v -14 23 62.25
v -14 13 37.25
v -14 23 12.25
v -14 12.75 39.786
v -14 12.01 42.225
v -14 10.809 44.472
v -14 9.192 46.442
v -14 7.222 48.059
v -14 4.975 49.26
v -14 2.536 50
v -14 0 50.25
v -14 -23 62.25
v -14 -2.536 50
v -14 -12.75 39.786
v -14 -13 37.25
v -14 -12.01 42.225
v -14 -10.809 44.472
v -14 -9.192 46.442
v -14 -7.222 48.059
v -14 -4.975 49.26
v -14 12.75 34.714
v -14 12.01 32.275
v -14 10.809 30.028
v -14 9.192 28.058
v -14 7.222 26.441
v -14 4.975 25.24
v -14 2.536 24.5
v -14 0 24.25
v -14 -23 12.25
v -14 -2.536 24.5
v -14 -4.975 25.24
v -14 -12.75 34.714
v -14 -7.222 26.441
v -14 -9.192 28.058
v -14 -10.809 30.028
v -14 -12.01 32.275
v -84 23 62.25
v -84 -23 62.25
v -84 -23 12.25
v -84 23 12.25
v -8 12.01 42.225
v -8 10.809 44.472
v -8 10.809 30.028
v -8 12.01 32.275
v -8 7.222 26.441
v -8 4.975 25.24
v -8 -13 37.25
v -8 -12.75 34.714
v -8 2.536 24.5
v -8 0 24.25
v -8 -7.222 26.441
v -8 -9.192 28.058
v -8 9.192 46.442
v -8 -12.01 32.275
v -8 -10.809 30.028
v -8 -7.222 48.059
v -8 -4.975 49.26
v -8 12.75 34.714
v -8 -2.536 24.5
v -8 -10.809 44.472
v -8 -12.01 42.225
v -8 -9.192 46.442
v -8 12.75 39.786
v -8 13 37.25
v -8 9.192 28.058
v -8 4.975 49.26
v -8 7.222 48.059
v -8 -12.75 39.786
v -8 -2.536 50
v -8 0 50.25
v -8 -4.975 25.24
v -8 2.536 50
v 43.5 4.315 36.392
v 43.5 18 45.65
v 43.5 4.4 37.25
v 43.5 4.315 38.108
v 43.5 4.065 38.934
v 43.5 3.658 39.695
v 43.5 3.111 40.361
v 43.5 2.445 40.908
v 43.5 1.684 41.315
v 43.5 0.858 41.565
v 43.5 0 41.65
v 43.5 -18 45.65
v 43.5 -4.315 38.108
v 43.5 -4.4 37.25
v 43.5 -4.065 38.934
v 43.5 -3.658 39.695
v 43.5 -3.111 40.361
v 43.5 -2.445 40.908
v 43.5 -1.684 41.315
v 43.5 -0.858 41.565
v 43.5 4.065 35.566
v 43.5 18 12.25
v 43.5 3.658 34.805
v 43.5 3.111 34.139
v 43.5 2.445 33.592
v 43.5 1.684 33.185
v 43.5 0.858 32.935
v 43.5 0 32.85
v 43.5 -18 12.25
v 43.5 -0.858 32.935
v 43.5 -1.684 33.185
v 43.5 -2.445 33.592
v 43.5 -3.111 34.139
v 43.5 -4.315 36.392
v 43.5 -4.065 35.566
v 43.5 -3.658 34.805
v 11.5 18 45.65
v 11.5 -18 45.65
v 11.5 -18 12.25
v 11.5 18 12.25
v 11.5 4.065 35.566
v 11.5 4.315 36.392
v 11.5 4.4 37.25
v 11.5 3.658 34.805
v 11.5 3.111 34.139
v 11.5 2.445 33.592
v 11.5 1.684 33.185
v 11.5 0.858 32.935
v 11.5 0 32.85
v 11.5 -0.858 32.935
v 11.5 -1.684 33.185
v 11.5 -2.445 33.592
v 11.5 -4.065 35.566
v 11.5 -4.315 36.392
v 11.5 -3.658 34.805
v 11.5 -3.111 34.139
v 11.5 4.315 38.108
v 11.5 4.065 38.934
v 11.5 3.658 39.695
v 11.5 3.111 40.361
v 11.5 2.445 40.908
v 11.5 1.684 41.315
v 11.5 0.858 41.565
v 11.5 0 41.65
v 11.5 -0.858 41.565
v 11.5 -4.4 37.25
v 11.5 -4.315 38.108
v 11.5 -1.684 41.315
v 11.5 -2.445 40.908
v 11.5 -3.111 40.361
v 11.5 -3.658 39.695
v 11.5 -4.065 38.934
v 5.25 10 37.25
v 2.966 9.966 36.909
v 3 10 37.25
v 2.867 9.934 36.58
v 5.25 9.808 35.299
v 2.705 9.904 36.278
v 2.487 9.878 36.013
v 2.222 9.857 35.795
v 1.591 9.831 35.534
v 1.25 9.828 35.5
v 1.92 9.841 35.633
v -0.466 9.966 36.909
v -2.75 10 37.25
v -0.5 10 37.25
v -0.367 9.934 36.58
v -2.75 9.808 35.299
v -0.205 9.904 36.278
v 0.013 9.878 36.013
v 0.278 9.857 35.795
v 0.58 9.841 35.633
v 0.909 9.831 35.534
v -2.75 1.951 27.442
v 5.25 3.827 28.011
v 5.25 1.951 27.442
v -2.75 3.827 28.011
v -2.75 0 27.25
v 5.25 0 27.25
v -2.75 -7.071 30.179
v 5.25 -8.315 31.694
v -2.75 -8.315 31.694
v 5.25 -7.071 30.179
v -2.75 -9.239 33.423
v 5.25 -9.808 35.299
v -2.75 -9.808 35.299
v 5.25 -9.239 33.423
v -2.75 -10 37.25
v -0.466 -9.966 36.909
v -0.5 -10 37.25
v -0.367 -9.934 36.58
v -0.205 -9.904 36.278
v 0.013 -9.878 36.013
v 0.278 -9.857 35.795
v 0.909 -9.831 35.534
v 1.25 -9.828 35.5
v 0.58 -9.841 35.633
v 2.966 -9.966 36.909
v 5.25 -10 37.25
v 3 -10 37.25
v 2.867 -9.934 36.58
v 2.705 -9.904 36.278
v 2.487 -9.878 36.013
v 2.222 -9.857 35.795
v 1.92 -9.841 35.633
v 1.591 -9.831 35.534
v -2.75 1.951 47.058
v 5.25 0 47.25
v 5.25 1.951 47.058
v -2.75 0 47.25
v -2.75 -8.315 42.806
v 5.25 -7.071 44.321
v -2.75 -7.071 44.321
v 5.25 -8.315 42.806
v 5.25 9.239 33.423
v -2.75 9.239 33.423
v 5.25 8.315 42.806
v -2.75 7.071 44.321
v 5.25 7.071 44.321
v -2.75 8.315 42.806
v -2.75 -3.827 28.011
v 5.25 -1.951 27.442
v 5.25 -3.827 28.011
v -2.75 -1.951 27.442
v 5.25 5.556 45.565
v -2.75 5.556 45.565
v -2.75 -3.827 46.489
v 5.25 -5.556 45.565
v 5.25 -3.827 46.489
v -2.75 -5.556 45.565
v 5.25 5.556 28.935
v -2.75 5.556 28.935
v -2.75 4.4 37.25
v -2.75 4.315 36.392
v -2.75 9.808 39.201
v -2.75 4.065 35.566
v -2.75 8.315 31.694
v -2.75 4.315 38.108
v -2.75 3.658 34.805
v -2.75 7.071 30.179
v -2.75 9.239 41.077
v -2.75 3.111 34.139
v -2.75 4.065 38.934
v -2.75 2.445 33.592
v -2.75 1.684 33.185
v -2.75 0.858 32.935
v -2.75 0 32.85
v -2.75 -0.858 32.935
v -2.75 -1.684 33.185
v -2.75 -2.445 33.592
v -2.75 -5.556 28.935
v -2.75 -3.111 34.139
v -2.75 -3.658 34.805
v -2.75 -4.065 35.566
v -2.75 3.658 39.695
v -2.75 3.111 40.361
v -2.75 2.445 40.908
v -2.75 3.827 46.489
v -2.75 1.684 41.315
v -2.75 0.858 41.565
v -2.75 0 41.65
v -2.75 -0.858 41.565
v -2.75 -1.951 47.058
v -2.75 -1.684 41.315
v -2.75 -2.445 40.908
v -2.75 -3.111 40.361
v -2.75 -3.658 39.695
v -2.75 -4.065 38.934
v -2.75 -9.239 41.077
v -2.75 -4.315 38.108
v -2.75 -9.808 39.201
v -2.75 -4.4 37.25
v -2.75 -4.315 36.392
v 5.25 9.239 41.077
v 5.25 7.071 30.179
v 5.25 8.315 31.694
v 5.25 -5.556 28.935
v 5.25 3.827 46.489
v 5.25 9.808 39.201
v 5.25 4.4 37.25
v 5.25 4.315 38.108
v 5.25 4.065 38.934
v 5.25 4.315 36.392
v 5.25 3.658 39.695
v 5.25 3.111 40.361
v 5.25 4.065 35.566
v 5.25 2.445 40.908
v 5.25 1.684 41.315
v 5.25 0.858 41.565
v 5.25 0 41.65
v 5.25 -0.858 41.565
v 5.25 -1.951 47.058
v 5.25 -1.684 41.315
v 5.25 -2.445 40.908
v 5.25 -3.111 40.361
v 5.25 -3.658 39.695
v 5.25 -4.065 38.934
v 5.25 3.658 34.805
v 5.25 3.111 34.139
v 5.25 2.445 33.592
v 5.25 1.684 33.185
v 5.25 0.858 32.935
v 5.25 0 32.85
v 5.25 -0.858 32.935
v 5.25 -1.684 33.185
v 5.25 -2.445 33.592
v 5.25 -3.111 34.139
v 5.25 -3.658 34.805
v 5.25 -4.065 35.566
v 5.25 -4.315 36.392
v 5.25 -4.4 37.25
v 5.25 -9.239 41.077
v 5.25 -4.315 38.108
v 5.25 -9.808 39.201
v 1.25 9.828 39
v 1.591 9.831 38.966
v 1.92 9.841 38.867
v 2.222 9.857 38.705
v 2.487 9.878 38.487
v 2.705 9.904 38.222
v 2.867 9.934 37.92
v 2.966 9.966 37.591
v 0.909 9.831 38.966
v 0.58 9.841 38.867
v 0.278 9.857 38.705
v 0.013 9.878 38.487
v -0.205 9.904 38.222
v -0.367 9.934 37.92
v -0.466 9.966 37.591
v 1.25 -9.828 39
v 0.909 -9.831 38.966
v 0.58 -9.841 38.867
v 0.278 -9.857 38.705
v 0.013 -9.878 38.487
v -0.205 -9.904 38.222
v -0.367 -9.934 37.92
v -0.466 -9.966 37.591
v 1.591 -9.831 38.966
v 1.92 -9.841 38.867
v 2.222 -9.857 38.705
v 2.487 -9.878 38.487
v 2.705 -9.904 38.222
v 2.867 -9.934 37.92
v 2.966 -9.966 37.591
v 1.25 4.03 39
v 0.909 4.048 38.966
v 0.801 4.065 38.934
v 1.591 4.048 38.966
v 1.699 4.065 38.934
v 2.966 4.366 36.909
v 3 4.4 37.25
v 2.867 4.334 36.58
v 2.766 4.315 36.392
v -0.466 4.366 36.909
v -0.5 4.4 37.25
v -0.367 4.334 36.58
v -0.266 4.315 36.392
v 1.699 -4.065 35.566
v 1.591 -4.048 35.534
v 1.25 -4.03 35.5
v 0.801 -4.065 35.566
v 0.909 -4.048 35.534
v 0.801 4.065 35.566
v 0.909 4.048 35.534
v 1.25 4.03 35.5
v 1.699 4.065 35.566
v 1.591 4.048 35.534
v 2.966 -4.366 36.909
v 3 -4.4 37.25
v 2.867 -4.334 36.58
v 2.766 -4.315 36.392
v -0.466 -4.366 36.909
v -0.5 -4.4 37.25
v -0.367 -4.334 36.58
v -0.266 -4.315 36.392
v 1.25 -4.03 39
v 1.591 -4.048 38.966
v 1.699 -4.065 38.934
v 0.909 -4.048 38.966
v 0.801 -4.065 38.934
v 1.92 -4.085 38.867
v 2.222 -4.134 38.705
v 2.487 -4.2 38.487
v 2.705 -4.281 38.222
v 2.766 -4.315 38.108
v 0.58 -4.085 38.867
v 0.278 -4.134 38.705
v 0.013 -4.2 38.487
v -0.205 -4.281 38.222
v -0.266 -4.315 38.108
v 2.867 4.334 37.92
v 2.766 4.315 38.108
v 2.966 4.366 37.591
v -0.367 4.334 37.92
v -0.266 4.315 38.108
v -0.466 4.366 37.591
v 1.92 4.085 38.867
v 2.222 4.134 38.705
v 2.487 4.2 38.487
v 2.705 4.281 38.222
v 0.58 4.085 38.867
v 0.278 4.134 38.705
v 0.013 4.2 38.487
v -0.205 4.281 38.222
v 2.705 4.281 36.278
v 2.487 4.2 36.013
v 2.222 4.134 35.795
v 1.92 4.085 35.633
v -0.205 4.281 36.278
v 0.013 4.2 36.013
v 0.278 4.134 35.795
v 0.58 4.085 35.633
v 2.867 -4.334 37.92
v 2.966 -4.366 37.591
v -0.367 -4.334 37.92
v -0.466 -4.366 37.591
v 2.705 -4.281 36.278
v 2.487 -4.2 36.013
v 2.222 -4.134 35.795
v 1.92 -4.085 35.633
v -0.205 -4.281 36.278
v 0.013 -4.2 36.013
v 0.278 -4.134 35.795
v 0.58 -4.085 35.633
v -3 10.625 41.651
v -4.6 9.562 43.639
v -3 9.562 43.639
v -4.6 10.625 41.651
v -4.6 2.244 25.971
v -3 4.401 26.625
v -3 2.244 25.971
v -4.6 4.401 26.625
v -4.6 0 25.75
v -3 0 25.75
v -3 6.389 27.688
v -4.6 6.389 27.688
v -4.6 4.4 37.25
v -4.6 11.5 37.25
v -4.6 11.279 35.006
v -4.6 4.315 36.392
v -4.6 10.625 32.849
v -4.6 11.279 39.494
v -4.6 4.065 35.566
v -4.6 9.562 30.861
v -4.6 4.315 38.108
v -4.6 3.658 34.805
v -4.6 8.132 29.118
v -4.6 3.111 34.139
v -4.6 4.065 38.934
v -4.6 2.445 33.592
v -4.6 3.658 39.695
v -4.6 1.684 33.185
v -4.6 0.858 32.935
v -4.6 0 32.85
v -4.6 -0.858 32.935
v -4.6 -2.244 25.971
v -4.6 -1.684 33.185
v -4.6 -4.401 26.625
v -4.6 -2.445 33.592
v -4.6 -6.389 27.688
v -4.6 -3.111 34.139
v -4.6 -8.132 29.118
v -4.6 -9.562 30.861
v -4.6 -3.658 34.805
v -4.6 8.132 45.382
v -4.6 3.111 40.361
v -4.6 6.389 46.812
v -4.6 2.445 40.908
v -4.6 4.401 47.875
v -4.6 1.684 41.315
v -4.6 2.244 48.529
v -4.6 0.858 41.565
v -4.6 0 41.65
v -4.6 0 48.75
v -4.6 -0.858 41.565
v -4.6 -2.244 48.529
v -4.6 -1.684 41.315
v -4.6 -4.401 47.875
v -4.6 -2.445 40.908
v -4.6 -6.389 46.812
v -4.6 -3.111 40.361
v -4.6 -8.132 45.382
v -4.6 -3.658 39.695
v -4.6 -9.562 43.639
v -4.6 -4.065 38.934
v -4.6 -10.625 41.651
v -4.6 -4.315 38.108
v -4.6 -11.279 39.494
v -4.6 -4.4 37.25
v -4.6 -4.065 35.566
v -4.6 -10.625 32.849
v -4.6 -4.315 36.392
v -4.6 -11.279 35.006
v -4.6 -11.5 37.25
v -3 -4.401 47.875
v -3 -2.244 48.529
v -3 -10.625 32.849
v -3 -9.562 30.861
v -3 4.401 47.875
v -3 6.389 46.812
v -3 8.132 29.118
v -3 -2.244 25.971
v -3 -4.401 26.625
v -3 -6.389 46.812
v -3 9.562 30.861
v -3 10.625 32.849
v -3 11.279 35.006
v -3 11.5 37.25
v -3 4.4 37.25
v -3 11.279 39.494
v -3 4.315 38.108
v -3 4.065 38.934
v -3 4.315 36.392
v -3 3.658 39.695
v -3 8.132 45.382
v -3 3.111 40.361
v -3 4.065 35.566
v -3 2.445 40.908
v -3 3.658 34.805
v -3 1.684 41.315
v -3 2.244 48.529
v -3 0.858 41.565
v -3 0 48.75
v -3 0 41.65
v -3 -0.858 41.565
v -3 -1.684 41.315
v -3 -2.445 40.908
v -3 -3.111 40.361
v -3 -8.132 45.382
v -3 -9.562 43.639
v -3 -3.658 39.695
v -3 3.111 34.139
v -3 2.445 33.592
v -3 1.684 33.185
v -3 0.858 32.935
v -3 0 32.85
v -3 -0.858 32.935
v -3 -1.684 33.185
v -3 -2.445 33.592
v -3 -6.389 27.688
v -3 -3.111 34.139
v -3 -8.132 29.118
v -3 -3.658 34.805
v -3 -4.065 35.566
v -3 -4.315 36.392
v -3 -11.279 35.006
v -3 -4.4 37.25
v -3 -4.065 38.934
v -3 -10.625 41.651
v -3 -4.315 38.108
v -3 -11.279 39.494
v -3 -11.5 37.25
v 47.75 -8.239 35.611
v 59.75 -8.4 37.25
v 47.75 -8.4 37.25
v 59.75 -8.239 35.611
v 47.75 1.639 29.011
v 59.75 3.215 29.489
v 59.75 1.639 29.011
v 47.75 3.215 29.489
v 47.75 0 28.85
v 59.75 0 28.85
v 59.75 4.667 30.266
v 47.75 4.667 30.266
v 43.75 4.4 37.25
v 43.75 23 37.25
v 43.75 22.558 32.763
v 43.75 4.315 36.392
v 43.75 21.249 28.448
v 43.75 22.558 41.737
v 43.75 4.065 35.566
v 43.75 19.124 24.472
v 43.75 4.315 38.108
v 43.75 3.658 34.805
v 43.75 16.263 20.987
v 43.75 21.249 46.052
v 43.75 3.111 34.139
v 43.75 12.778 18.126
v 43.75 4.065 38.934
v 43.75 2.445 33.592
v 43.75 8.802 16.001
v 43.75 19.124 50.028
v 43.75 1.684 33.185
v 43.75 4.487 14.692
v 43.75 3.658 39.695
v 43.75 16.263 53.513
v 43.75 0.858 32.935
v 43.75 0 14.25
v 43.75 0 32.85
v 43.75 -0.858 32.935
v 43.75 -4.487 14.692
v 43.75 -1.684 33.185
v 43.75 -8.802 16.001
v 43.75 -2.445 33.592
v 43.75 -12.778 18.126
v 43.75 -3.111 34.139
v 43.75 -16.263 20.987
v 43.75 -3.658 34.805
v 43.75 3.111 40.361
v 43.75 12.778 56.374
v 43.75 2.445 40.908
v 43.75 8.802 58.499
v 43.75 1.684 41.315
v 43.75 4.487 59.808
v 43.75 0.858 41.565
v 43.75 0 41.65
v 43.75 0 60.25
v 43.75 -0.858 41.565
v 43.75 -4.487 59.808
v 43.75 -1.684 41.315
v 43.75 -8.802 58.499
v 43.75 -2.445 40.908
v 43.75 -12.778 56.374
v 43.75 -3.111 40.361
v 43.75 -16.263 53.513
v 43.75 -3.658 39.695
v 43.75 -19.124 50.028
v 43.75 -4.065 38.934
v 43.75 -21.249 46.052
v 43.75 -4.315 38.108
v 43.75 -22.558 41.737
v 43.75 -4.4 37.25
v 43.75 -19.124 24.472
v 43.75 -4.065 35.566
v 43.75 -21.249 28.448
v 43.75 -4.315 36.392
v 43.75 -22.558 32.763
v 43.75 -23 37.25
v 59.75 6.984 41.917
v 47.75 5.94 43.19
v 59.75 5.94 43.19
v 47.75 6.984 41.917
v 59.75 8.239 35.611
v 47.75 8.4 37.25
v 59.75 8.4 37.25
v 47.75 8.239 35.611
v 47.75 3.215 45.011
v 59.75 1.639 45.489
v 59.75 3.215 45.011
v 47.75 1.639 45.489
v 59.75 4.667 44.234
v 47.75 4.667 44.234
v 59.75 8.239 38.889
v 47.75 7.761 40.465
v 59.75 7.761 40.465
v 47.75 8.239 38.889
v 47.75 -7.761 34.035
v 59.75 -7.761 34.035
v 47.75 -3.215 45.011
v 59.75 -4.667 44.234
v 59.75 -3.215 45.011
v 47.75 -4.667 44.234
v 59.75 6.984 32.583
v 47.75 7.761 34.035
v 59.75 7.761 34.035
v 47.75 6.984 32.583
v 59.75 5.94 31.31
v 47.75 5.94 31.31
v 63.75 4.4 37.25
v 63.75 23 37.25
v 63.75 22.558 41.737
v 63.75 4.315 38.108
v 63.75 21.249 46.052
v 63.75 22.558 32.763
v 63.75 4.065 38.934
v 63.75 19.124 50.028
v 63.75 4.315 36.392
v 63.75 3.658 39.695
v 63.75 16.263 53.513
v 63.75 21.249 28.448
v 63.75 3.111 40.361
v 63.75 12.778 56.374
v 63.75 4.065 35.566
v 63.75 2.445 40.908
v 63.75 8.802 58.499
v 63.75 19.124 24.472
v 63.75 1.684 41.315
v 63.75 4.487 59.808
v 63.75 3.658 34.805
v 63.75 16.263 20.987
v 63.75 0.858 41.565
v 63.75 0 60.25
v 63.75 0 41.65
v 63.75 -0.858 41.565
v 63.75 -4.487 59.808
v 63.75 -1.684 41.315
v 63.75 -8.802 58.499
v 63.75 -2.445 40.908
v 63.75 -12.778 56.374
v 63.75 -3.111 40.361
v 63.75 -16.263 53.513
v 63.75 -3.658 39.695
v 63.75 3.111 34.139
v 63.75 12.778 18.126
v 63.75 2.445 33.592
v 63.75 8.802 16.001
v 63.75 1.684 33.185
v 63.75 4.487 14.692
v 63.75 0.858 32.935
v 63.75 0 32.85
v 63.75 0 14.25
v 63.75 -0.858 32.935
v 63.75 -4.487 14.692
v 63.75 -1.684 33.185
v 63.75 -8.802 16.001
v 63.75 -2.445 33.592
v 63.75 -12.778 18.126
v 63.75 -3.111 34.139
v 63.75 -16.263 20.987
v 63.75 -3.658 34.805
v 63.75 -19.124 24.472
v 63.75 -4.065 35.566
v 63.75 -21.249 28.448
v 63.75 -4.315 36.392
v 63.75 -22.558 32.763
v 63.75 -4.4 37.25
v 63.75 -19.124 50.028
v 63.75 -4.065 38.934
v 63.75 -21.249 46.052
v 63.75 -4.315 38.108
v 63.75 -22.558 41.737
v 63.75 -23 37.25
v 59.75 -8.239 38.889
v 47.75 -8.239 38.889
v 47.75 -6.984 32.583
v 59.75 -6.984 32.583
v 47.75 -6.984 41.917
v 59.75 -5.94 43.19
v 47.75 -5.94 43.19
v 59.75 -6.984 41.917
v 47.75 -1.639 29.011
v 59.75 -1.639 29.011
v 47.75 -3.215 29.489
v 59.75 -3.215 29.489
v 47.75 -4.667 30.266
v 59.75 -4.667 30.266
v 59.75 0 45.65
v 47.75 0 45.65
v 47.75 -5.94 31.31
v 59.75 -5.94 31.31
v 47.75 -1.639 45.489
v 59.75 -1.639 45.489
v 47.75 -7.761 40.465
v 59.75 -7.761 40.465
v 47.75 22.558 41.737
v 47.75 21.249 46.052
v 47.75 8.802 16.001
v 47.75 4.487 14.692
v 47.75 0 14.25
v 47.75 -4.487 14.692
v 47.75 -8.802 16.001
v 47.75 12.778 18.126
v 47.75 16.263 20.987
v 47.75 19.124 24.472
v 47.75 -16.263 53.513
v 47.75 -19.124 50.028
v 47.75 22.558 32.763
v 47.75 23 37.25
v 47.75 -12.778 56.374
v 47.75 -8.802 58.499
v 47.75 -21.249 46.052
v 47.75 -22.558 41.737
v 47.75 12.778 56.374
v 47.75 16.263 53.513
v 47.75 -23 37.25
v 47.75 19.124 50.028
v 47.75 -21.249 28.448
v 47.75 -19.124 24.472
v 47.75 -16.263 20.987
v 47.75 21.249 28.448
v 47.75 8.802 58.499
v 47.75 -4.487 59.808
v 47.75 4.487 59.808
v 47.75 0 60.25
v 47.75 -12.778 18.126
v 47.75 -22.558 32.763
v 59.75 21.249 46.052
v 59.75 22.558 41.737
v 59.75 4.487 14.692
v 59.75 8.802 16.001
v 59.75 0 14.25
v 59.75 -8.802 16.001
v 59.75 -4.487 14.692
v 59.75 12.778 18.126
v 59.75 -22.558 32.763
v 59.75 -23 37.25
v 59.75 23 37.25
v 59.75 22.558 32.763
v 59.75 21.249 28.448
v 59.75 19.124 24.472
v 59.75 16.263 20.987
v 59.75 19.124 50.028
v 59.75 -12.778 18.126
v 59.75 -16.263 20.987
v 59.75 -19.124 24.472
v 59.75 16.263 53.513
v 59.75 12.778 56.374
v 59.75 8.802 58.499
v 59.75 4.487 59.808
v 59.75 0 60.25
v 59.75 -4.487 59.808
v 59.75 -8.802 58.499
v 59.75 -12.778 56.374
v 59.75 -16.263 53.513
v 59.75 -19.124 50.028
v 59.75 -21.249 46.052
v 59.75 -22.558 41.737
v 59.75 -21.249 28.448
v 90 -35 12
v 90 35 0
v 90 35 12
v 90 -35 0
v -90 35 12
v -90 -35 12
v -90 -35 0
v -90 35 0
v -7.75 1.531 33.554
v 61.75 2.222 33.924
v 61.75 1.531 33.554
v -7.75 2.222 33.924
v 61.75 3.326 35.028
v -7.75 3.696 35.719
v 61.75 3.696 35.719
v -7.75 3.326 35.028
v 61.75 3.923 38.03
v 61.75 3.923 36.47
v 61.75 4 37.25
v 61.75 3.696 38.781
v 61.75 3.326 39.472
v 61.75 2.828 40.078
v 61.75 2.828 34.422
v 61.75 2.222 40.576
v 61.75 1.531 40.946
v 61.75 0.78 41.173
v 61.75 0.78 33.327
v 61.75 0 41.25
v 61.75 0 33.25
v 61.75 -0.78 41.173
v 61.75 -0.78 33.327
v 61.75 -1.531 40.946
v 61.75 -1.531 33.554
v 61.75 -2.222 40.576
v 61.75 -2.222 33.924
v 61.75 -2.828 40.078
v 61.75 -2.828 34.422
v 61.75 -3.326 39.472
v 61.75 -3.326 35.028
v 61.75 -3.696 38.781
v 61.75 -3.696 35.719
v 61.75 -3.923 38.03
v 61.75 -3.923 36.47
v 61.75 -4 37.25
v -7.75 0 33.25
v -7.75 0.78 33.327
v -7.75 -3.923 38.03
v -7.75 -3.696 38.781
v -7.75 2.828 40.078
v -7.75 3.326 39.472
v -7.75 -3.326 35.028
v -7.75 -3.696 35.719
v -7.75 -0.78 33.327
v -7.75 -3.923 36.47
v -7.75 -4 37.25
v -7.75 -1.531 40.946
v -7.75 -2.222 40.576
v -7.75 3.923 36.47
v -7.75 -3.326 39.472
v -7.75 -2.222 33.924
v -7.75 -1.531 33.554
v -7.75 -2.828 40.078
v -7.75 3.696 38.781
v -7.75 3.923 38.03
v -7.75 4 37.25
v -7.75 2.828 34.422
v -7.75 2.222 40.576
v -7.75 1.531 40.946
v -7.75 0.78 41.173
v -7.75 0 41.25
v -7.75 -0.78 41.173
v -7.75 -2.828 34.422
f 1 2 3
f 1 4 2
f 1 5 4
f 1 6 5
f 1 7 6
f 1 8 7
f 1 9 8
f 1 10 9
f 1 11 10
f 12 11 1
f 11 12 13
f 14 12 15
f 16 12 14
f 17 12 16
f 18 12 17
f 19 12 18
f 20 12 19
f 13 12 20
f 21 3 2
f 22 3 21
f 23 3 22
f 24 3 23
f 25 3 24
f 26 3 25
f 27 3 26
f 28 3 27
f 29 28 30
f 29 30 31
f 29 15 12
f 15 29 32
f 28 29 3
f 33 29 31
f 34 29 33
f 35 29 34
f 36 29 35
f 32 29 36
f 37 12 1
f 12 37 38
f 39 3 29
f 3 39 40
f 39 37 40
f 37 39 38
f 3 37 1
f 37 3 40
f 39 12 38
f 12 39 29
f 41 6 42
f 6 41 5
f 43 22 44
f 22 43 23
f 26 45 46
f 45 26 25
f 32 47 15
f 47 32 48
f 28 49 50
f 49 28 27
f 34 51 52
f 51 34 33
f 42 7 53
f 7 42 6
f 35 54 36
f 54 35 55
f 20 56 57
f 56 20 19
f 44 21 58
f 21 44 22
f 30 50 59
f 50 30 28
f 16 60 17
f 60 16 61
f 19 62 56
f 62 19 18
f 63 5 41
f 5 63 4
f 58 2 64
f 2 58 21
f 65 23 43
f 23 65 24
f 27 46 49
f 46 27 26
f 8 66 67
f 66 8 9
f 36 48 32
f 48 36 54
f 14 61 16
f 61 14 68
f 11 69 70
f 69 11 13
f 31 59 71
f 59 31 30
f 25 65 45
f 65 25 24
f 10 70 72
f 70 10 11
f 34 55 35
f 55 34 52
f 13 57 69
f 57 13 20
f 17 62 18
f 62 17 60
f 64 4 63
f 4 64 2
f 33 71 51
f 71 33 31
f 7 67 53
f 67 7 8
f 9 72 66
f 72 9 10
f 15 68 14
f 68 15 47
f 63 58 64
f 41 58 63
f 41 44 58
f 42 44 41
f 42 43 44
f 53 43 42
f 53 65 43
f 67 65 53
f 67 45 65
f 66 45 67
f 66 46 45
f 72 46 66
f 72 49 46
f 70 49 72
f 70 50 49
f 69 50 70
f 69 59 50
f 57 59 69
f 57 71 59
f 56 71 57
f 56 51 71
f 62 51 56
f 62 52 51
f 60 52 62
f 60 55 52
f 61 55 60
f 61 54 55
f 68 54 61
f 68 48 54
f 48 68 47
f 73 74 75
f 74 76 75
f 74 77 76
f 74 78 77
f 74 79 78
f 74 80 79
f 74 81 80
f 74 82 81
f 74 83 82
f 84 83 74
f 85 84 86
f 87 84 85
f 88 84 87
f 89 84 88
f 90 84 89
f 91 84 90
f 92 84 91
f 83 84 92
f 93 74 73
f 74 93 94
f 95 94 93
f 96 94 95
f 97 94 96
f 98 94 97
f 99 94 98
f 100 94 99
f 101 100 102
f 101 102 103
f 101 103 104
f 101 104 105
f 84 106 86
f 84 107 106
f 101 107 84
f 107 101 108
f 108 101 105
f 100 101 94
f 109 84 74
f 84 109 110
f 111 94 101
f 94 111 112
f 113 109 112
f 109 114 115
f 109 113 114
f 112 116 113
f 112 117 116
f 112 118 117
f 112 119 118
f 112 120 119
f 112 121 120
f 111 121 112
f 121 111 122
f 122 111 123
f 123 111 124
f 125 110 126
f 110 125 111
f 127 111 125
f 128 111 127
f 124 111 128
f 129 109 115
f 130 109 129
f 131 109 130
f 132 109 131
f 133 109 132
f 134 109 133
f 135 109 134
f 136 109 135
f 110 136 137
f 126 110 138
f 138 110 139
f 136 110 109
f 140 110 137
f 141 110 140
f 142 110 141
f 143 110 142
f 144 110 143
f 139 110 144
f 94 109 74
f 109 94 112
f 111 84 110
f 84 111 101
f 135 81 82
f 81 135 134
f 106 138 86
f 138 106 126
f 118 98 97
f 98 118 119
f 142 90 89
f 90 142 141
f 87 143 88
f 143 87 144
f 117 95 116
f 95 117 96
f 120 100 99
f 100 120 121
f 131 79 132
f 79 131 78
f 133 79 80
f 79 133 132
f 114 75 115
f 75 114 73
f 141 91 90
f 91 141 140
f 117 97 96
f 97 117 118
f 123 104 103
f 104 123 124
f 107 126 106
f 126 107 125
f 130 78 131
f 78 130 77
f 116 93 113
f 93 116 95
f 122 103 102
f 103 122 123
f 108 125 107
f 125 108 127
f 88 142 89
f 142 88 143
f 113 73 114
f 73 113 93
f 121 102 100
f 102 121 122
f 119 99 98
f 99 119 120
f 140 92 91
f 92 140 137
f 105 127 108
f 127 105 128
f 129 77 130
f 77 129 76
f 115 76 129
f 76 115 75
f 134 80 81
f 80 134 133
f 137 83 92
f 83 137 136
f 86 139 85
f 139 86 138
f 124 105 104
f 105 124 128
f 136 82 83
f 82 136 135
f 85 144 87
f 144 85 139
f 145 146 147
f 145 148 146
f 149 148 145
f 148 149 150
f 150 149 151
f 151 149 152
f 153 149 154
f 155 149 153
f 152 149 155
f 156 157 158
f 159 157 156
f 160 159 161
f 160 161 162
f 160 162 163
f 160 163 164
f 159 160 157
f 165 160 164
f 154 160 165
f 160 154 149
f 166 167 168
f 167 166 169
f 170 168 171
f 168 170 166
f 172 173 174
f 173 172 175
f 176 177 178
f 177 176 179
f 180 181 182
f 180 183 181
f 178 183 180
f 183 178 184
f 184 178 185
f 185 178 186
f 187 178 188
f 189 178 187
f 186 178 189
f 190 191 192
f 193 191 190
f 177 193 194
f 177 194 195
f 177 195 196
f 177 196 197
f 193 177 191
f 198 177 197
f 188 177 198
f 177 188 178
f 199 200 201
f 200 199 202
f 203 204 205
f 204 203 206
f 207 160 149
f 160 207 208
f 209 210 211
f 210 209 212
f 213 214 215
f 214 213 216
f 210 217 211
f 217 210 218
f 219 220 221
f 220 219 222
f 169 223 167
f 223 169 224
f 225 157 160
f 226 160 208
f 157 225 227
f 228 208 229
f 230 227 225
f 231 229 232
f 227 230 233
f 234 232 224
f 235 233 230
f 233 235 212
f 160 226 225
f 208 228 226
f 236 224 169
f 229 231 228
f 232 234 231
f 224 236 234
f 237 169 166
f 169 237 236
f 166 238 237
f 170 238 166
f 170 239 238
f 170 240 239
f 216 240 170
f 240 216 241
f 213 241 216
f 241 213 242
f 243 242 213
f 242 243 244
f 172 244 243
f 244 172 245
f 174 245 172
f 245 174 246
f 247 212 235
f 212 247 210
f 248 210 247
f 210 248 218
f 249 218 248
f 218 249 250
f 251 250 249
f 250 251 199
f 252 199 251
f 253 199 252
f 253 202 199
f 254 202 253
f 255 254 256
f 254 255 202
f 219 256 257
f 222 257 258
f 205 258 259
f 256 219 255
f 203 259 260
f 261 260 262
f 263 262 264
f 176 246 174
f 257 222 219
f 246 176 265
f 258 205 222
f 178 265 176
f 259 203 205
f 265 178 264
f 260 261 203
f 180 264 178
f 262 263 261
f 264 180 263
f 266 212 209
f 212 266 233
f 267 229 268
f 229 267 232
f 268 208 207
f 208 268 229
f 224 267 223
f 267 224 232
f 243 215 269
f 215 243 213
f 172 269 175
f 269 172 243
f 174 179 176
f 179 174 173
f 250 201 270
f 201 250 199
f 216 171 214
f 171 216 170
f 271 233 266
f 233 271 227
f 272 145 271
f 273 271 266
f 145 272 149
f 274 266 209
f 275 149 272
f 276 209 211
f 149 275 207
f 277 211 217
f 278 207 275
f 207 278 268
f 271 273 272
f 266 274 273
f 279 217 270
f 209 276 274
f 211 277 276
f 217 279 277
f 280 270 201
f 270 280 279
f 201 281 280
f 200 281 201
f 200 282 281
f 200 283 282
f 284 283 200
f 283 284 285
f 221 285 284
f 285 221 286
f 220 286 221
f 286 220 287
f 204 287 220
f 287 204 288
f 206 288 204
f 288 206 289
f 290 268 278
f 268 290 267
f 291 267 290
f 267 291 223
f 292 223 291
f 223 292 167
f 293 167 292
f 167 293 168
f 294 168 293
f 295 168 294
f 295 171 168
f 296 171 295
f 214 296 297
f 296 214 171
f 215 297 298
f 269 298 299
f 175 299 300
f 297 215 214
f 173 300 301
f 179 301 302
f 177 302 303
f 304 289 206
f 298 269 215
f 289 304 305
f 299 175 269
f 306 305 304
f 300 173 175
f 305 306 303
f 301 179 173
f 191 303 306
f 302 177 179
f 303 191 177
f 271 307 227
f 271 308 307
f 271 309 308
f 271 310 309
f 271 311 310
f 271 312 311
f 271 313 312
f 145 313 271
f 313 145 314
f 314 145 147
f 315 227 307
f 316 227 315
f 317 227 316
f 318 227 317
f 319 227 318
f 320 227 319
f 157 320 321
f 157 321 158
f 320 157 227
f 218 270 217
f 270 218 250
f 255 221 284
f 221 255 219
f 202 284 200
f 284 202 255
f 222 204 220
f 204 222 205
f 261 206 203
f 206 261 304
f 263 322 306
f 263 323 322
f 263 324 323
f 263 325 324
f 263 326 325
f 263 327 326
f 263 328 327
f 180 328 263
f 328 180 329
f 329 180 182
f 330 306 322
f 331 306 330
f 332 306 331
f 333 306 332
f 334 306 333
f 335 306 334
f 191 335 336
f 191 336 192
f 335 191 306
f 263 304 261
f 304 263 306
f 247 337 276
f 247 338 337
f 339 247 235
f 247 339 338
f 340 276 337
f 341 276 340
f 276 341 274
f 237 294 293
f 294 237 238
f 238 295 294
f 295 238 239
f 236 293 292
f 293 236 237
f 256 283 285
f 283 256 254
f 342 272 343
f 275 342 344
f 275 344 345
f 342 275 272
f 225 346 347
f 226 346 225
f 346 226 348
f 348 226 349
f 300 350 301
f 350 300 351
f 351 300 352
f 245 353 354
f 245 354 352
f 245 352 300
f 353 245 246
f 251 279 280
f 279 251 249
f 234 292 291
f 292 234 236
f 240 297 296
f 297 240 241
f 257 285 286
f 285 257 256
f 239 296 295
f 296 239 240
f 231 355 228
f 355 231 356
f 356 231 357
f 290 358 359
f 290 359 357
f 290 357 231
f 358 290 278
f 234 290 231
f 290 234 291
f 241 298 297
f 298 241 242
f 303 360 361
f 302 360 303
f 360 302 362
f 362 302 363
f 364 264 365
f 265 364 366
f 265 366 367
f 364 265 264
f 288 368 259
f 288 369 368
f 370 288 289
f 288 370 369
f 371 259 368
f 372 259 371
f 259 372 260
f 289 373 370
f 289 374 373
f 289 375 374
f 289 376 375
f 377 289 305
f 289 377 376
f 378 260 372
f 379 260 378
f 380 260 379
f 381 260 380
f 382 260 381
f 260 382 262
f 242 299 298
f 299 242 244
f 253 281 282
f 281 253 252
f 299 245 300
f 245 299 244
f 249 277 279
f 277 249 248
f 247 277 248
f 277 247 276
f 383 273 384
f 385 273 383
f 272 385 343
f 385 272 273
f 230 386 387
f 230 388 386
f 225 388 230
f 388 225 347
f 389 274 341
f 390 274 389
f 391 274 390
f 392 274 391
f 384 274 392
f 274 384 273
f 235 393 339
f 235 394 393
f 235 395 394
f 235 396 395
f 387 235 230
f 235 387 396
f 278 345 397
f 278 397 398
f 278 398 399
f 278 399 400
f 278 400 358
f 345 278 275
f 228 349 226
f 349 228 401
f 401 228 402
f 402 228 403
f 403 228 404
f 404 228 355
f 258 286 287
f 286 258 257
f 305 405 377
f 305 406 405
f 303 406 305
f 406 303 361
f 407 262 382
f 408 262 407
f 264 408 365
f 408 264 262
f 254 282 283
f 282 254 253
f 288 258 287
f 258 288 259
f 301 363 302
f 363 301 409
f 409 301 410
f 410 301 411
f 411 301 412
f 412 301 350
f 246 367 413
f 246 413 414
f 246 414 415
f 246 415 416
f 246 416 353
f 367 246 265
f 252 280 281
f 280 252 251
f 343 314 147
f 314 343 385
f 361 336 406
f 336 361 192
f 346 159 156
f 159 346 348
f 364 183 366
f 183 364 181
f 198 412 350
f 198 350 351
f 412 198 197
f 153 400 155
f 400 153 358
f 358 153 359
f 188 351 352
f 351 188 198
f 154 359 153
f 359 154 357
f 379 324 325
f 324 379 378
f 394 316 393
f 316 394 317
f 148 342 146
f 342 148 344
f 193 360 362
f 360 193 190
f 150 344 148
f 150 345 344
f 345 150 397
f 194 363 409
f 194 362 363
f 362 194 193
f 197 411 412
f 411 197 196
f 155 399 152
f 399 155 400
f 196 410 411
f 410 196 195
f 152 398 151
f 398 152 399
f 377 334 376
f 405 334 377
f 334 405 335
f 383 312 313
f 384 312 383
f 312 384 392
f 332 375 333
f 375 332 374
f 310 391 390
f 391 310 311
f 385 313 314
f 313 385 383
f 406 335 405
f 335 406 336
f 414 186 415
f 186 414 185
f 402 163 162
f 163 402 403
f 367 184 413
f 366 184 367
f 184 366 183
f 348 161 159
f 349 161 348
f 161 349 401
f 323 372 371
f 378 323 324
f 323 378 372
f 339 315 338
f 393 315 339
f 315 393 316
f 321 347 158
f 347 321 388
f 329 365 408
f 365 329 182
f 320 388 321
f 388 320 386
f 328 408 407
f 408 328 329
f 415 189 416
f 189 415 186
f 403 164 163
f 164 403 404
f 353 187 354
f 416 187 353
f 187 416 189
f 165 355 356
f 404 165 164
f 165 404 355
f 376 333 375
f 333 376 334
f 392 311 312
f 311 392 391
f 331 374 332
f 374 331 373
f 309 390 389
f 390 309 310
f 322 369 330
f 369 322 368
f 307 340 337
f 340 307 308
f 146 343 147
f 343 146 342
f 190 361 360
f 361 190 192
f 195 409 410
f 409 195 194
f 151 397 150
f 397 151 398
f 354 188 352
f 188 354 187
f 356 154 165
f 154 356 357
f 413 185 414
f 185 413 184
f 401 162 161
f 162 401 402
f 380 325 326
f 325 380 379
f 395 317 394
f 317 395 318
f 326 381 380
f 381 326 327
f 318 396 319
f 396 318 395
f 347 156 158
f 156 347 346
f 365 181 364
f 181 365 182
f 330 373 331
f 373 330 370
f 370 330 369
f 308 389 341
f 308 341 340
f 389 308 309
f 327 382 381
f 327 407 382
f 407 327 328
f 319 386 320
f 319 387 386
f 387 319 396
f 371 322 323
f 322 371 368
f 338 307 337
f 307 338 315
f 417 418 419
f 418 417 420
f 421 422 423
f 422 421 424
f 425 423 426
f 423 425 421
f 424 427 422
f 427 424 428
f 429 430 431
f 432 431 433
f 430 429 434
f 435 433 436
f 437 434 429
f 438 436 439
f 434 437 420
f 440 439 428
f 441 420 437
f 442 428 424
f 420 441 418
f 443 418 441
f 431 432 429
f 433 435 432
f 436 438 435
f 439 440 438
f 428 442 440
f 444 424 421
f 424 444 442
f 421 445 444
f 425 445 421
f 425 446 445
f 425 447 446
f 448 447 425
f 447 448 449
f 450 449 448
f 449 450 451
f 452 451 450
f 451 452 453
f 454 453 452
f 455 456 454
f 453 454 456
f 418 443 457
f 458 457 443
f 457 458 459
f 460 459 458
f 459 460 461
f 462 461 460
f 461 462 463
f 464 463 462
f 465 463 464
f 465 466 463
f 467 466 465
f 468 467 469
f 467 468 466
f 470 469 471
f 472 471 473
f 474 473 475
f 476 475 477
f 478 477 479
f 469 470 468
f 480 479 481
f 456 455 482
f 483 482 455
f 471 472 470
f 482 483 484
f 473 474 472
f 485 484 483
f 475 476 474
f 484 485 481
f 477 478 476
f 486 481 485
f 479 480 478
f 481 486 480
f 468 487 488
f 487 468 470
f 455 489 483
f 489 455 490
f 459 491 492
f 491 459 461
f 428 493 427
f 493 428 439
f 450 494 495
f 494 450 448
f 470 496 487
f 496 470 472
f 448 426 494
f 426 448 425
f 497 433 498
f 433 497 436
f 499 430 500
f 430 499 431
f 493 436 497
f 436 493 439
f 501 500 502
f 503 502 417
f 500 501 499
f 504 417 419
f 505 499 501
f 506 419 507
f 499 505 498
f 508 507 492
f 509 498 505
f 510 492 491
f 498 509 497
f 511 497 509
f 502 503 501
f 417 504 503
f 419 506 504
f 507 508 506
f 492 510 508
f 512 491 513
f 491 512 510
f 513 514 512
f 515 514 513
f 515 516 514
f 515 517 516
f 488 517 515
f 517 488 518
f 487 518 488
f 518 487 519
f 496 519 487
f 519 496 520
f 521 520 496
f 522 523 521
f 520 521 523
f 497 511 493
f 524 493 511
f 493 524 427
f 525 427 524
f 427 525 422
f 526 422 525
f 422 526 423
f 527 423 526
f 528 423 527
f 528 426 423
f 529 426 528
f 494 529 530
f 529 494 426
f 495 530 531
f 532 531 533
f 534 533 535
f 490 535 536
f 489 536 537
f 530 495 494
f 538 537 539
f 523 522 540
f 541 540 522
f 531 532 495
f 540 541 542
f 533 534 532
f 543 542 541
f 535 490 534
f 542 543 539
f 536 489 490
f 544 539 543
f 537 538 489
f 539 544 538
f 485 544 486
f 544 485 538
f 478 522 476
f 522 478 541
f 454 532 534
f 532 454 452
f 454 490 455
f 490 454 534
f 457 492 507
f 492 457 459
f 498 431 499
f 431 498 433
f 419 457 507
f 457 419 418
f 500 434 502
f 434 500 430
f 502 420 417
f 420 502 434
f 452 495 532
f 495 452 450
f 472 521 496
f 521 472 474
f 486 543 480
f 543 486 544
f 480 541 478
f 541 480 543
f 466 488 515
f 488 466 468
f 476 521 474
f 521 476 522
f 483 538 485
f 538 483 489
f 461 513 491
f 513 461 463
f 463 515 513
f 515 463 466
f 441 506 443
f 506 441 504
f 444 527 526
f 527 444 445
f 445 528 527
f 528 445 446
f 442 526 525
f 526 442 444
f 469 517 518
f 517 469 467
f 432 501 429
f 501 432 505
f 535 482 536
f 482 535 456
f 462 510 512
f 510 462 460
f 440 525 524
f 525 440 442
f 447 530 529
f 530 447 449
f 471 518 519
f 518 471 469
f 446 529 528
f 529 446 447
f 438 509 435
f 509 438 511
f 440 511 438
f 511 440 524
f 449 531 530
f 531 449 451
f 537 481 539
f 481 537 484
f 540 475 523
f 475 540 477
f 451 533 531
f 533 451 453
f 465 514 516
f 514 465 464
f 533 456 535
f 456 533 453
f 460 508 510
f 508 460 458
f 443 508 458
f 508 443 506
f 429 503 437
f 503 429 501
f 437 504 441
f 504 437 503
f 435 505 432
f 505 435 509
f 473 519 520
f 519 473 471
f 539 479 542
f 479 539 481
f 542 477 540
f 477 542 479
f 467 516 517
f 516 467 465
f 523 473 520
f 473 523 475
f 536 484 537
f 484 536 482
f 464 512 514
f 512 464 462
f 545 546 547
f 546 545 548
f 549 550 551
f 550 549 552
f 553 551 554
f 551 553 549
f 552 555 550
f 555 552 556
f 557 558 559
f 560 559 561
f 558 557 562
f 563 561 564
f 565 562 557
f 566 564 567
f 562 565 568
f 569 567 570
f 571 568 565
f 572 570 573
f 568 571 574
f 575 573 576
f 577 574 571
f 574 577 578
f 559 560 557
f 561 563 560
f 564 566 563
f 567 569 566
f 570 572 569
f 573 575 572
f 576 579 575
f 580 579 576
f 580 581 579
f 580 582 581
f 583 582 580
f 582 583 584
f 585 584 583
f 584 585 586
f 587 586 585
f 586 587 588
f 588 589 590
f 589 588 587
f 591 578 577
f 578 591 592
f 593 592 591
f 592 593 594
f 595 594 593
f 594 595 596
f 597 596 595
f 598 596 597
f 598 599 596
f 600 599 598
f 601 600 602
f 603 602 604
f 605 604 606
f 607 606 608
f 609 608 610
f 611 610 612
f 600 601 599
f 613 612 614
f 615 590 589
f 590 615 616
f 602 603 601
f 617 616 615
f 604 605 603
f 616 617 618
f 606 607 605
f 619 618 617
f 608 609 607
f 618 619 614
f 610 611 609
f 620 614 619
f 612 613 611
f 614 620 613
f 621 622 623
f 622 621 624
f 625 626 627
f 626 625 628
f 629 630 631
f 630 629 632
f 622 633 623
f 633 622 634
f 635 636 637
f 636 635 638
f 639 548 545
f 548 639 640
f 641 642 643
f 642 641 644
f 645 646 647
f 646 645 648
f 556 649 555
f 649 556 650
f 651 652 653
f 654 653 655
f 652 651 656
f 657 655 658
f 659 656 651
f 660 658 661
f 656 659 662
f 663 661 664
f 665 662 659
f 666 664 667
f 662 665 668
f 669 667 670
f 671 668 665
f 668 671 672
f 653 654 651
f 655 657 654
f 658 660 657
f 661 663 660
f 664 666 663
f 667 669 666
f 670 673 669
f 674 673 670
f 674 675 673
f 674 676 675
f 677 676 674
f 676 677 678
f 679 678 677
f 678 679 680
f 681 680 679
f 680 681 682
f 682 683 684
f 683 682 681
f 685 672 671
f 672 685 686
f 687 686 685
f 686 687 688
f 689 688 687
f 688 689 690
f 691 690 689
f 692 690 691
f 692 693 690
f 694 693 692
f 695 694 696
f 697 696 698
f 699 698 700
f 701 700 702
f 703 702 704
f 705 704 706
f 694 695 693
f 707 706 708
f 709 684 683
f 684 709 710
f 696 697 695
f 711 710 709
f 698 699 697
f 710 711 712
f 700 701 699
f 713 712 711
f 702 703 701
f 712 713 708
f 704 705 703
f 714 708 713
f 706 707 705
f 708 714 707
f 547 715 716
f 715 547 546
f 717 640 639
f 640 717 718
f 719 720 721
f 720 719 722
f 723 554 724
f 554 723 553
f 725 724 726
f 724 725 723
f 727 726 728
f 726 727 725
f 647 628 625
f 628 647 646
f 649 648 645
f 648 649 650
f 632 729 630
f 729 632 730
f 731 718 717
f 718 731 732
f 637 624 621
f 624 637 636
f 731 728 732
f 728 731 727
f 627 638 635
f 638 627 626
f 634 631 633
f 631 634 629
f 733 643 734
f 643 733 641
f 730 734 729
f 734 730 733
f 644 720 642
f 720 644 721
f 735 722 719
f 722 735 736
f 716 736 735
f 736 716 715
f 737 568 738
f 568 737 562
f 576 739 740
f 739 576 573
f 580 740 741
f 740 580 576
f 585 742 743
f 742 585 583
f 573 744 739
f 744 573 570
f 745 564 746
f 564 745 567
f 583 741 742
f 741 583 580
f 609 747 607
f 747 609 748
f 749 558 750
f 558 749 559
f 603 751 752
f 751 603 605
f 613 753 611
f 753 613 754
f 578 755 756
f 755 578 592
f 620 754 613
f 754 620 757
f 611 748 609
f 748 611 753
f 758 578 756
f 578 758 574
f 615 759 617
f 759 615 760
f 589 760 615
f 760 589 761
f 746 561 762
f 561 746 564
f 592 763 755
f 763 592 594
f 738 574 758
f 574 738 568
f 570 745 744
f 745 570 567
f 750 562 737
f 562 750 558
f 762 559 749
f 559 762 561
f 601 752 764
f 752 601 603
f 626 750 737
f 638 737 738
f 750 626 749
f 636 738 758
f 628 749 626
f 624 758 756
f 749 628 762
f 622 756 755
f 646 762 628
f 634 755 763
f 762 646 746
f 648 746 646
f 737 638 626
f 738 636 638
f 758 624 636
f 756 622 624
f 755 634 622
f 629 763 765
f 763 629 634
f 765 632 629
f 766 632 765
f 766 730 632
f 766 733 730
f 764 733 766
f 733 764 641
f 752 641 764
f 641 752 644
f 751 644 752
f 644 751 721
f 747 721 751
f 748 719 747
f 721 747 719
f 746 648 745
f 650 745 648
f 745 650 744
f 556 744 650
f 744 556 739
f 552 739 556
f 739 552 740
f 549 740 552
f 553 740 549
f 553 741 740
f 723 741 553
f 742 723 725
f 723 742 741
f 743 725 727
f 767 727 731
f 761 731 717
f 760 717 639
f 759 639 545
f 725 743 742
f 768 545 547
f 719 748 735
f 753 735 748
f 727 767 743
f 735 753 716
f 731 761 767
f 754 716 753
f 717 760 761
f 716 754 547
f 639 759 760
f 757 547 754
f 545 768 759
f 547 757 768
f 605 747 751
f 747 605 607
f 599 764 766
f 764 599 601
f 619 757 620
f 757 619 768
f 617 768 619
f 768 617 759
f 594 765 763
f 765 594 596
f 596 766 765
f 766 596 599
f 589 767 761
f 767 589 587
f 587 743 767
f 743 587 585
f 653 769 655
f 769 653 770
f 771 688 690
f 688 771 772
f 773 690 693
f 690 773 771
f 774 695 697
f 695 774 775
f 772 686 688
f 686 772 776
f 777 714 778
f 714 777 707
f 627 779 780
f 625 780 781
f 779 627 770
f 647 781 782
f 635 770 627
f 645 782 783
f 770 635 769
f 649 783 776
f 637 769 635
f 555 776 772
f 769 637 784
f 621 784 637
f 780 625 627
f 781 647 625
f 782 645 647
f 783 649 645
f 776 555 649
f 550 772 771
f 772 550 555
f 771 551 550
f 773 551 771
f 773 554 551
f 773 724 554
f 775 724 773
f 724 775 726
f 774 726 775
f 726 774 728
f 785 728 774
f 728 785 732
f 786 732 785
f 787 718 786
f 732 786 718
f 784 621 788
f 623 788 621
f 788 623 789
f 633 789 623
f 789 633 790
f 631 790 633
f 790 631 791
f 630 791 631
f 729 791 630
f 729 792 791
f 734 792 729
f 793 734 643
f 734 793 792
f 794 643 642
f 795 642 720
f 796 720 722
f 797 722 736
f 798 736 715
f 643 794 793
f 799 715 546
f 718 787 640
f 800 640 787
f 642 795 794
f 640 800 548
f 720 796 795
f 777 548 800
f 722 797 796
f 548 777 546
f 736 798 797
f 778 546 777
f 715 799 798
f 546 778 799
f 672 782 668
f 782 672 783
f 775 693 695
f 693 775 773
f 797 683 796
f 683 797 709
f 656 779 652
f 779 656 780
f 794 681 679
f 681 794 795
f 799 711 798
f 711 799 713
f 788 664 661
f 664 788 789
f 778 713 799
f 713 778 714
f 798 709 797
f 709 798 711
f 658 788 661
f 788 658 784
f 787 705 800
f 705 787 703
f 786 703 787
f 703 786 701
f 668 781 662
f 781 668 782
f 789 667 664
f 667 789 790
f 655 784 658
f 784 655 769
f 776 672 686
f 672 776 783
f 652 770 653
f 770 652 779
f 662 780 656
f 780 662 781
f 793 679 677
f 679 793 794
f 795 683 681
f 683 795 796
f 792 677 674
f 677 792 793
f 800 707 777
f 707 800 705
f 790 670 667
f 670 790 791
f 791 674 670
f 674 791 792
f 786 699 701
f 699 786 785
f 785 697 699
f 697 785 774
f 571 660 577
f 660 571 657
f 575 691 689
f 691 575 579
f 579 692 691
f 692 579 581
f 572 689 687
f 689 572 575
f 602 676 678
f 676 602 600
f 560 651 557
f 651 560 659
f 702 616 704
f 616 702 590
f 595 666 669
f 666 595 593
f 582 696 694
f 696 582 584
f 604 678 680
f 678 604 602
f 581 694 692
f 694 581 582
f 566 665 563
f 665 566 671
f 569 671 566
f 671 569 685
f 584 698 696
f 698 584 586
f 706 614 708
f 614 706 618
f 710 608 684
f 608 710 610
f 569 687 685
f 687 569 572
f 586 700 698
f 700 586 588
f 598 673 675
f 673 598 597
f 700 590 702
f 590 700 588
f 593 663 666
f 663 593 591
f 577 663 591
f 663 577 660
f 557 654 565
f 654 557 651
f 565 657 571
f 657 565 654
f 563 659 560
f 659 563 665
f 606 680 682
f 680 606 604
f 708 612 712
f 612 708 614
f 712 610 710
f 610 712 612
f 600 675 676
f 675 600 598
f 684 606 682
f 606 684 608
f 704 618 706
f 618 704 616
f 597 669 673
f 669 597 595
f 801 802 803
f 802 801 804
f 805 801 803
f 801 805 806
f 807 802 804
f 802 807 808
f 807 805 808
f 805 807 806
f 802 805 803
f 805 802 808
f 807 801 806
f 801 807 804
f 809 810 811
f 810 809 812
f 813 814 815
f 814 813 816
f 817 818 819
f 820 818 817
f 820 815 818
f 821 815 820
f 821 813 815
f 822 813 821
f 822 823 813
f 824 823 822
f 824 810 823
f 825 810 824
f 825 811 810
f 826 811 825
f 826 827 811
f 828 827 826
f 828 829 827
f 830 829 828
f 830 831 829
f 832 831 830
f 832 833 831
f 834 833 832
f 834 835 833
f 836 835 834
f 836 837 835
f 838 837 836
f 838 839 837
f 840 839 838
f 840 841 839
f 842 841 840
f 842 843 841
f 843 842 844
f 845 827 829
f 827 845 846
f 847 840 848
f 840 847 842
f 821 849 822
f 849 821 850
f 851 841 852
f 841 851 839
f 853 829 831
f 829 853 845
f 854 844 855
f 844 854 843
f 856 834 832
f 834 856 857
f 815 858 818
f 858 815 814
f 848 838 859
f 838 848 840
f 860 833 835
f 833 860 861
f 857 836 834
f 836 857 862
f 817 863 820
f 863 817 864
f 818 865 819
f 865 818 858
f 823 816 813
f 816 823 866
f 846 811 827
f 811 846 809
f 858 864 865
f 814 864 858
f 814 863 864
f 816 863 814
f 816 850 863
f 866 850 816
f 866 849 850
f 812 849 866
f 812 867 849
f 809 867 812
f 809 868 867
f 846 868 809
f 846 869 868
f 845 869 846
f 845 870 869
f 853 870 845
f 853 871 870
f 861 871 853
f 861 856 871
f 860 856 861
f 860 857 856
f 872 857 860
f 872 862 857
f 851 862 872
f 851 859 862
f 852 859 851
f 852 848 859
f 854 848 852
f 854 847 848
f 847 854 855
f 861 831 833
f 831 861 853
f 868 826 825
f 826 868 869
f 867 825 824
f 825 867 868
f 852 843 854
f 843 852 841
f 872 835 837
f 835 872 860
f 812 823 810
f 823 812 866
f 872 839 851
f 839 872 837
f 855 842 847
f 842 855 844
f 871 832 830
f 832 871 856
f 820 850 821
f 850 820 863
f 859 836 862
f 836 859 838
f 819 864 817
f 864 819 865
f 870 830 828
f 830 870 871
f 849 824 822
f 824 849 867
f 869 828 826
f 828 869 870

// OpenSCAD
$fn = 32;

// ------------------------------------------------------------------------
// Motor drive station: motor 70 x 50 mm, shaft d8, pulley d46
// Every part is its own module, assembly() places every instance.
// ------------------------------------------------------------------------

// --- part 1 ---
module station_bed() {
  difference() {
    translate([-90, -35, 0]) cube([180, 70, 12]);
  }
}

// --- part 2 ---
module drive_motor() {
  union() {
    translate([-35, -23, 0]) cube([70, 46, 50]);
    translate([38, 0, 25]) rotate([0, 90, 0]) cylinder(h = 6, d = 26, center = true);
  }
}

// --- part 3 ---
module pillow_block() {
  difference() {
    translate([-16, -18, 0]) cube([32, 36, 33.4]);
    translate([0, 0, 25]) rotate([0, 90, 0]) cylinder(h = 34, d = 8.8, center = true);
  }
}

// --- part 4 ---
module drive_shaft() {
  translate([0, 0, -34.75]) cylinder(h = 69.5, d = 8);
}

// --- part 5 ---
module shaft_collar() {
  difference() {
    cylinder(h = 8, d = 20);
    translate([0, 0, -1]) cylinder(h = 10, d = 8.8);
    translate([0, 0, 4]) rotate([90, 0, 0]) cylinder(h = 22, d = 3.5, center = true);
  }
}

// --- part 6 ---
module collar_washer() {
  difference() {
      translate([0, 0, 0]) cylinder(h = 1.6, d = 23);
      translate([0, 0, -1]) cylinder(h = 3.6, d = 8.8);
    }
}

// --- part 7 ---
module drive_pulley() {
  difference() {
    union() {
      cylinder(h = 20, d = 16.8);
      cylinder(h = 4, d = 46);
      translate([0, 0, 16]) cylinder(h = 4, d = 46);
    }
    translate([0, 0, -1]) cylinder(h = 22, d = 8.8);
  }
}

// --- assembly ---
module assembly() {
  color([0.80, 0.24, 0.20]) translate([0, 0, 0]) rotate([0, 0, 0]) station_bed();
  color([0.20, 0.45, 0.75]) translate([-49, 0, 12.25]) rotate([0, 0, 0]) drive_motor();
  color([0.25, 0.62, 0.32]) translate([27.5, 0, 12.25]) rotate([0, 0, 0]) pillow_block();
  color([0.92, 0.70, 0.18]) translate([27, 0, 37.25]) rotate([0, 90, 0]) drive_shaft();
  color([0.58, 0.35, 0.70]) translate([-2.75, 0, 37.25]) rotate([0, 90, 0]) shaft_collar();
  color([0.16, 0.66, 0.66]) translate([-4.6, 0, 37.25]) rotate([0, 90, 0]) collar_washer();
  color([0.85, 0.48, 0.18]) translate([43.75, 0, 37.25]) rotate([0, 90, 0]) drive_pulley();
}

assembly();
